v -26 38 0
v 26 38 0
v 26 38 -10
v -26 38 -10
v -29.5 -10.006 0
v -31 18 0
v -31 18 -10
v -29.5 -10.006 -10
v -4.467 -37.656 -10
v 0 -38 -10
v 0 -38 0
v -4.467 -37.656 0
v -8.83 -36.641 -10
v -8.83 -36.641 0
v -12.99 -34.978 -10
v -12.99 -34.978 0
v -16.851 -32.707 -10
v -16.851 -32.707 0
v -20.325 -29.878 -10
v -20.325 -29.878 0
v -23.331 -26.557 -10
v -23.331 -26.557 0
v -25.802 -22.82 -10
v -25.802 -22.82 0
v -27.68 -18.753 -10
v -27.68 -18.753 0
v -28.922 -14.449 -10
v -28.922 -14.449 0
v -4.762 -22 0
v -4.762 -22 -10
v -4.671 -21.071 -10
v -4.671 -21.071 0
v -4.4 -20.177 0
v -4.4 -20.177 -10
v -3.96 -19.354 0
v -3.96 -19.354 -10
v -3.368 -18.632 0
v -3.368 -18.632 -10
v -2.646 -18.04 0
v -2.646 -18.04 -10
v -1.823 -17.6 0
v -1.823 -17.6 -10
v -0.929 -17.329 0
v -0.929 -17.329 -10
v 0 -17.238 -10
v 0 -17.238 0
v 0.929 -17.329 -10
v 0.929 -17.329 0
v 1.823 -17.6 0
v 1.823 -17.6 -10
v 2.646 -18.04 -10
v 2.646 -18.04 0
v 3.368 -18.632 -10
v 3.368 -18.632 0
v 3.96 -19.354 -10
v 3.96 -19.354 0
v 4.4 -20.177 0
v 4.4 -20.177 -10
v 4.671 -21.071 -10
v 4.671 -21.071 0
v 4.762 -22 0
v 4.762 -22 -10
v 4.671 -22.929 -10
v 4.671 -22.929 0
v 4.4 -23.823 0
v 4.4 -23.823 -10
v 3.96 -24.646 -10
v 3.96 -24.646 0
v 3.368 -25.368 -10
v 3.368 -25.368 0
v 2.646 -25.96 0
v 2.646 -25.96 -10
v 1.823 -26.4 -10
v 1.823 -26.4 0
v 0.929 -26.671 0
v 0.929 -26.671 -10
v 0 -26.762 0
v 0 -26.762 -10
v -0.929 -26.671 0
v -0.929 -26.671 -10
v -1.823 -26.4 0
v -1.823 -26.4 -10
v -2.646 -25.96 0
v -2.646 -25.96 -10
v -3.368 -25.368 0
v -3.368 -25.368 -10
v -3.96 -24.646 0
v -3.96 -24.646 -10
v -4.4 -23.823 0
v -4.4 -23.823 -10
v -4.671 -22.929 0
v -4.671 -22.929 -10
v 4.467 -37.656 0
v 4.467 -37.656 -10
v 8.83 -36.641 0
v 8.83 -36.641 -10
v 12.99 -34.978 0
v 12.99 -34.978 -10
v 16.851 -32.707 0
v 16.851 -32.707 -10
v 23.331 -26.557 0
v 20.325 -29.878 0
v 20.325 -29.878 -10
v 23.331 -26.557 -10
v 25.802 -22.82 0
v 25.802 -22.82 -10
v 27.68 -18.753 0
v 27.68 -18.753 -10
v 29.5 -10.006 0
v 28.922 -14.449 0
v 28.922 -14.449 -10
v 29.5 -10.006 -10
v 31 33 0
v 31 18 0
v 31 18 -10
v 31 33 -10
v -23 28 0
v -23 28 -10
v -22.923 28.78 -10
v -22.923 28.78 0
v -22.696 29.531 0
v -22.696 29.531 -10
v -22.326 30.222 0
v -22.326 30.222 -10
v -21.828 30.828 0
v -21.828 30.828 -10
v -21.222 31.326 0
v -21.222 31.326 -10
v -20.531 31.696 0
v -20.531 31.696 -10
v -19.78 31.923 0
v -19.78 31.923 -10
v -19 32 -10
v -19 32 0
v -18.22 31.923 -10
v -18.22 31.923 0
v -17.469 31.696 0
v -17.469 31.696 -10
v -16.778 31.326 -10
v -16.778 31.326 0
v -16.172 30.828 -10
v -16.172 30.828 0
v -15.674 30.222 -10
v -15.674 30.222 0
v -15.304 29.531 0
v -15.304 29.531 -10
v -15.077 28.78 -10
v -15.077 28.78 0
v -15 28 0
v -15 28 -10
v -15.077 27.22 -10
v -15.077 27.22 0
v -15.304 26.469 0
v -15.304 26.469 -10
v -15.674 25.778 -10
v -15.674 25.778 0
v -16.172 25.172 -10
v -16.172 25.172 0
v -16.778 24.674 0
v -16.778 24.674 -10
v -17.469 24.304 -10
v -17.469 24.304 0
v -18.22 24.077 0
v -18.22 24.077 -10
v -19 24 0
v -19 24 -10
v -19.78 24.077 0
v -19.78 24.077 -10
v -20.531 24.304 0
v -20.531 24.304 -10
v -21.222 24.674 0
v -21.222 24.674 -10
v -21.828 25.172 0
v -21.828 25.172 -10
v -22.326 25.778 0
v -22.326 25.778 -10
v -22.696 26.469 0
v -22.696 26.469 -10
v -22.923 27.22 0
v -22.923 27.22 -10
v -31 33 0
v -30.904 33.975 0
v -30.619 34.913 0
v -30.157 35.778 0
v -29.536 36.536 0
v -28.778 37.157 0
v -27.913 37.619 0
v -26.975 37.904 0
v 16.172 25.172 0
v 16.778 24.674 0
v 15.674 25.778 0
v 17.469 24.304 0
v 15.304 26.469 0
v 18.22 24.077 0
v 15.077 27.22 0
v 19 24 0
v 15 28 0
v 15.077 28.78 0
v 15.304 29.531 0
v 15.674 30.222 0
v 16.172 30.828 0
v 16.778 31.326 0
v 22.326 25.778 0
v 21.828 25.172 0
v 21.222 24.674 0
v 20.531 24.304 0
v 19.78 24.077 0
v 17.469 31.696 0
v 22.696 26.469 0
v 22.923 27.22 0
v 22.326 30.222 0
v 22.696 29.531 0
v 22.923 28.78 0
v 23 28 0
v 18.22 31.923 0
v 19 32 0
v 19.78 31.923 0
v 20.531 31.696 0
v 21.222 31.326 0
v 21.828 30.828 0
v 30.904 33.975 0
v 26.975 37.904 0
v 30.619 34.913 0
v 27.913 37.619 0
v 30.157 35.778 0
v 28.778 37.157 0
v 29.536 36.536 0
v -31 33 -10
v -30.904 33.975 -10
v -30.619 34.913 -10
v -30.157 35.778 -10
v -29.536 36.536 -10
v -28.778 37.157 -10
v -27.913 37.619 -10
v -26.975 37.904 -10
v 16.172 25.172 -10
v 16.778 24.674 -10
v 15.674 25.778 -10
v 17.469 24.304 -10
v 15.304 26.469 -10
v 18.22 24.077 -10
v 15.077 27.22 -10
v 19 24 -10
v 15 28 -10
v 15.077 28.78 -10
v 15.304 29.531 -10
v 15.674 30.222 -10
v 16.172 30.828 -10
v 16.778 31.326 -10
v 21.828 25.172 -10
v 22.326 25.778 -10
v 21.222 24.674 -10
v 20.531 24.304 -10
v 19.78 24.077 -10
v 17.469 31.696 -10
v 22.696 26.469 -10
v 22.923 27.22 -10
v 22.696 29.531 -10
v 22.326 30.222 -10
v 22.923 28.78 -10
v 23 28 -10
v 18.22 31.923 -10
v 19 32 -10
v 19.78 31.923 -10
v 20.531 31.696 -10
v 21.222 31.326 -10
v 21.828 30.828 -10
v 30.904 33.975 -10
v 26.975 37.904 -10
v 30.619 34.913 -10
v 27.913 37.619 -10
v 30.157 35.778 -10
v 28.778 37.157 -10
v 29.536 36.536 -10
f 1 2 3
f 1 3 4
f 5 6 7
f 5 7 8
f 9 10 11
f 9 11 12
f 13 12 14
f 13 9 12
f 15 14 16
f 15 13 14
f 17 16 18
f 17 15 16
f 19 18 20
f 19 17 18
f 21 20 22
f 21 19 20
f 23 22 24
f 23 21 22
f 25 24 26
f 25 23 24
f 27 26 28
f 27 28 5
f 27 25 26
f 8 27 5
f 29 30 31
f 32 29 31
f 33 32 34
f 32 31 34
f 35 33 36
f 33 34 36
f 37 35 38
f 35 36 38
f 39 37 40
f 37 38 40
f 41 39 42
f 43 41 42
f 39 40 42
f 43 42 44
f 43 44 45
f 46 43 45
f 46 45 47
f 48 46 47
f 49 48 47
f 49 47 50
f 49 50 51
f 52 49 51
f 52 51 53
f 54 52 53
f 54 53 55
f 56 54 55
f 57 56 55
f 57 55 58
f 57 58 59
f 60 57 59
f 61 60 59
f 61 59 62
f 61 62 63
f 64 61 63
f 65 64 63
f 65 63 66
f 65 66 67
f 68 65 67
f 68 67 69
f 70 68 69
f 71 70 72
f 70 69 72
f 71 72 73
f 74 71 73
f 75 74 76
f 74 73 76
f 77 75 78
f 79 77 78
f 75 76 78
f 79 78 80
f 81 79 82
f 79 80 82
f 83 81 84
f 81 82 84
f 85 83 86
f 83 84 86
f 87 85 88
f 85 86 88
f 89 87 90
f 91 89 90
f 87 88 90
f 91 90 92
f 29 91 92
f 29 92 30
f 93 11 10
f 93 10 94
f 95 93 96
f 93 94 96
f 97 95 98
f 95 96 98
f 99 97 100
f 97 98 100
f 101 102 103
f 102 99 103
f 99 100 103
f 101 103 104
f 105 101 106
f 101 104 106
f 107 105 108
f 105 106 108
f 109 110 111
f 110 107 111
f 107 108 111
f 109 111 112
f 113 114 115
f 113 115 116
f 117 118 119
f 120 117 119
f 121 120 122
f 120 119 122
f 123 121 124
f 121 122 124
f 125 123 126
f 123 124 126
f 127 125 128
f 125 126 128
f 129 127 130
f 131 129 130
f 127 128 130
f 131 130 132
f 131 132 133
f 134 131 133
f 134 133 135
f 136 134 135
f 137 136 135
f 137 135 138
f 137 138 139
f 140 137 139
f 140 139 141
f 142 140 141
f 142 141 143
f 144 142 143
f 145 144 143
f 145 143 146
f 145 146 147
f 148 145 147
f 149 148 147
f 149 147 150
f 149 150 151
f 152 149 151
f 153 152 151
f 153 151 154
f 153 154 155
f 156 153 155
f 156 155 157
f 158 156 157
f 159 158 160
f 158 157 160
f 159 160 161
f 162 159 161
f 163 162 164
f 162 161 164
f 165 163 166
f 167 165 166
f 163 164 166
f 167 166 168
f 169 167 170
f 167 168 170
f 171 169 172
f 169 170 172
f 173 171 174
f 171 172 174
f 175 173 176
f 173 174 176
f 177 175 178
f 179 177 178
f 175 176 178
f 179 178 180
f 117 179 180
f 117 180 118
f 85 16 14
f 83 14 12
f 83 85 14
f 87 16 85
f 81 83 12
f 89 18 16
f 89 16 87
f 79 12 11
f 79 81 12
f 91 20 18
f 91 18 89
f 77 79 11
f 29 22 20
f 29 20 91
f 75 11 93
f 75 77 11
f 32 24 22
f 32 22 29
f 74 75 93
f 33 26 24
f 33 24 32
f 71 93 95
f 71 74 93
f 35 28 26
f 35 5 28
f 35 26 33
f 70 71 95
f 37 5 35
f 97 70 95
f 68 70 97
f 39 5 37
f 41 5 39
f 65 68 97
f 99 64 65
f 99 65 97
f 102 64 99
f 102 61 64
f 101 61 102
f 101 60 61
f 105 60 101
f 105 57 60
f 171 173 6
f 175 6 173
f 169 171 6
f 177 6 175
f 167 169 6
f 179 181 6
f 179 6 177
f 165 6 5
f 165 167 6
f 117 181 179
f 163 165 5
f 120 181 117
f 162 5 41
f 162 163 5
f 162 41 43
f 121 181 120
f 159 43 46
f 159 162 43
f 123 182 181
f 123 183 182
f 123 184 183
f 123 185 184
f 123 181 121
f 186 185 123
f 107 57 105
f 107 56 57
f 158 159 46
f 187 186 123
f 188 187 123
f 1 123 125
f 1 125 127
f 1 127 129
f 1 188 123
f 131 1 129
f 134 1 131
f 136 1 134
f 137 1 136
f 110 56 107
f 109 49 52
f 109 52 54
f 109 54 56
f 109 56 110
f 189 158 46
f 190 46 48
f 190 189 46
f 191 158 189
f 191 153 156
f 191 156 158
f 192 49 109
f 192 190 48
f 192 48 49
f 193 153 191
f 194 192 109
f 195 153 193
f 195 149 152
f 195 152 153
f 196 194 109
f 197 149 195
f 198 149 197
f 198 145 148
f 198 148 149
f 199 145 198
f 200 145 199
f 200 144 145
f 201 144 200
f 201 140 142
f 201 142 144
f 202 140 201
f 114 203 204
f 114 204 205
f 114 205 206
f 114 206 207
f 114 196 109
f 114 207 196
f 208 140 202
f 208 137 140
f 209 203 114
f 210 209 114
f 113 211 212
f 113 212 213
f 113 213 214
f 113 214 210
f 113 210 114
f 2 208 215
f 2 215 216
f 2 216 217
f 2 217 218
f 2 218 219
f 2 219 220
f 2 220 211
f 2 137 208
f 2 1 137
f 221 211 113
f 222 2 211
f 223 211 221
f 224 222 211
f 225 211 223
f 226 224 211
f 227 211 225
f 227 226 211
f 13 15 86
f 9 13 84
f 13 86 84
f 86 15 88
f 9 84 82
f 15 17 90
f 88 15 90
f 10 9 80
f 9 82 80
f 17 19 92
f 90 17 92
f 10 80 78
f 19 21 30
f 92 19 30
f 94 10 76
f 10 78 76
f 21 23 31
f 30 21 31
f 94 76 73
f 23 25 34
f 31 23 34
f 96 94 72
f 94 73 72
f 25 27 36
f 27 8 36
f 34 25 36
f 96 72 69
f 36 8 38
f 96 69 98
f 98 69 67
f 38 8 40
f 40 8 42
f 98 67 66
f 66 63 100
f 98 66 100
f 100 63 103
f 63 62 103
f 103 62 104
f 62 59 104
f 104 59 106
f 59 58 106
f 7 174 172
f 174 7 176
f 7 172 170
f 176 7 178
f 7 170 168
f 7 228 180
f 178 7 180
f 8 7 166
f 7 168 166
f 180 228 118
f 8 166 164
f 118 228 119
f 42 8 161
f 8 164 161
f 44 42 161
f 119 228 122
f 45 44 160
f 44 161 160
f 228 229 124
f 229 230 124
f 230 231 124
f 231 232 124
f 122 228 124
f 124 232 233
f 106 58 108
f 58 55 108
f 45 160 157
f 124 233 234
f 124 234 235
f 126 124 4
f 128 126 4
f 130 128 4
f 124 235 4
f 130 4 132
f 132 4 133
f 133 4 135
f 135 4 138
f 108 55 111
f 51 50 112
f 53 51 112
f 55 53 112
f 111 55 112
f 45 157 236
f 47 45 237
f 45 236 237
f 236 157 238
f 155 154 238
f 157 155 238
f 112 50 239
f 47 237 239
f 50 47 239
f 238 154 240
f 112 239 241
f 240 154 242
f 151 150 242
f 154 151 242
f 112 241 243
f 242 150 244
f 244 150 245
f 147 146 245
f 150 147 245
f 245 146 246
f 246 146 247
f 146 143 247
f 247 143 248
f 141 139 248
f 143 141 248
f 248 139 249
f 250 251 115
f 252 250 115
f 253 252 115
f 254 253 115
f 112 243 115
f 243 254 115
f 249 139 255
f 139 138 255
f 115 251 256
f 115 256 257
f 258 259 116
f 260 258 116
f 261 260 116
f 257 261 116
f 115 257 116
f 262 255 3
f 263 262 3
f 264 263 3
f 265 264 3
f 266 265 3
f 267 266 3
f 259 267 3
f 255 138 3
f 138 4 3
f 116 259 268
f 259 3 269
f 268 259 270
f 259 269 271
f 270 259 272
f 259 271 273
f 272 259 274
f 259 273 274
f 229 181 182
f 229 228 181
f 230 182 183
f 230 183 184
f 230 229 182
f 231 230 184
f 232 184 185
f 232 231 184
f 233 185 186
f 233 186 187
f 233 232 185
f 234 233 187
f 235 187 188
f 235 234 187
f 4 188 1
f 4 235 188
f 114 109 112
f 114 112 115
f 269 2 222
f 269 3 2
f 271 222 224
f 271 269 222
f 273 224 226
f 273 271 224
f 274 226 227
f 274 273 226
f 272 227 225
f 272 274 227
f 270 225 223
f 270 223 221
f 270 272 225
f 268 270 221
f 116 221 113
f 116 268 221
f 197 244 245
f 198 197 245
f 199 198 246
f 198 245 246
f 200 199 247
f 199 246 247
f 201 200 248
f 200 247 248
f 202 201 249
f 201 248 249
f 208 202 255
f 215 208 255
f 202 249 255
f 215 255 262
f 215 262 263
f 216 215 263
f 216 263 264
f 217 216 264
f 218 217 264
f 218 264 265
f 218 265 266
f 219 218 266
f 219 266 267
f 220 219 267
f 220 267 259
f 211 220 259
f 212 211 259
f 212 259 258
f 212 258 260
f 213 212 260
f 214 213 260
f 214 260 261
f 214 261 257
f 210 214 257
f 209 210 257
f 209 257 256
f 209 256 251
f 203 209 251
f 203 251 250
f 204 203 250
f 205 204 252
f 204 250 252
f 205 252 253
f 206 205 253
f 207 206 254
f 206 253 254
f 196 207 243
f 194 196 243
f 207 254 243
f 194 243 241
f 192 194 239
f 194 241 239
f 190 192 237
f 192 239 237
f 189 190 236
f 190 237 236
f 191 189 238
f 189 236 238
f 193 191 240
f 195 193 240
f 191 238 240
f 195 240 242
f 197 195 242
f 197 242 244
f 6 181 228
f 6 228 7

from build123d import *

# Parameters (mm, degrees)
F0_W        = 56
F0_H        = 76
F1_DEPTH    = 10
F2_D        = 9.525
F3_T1_DEPTH = 150.1699053678
F4_R        = 5
F5_D        = 8


# Not quite as in the source:
# - a fillet or chamfer that OpenCascade refuses, or shapes differently, is made with other operations: its cross-section is extruded or revolved along the edge and cut away or added
# - a length typed as a fraction of an inch, garbled in the dataset ("3 / 203.2 mm" for 3/8 in), is restored


with BuildPart() as f1:
    # F0 (on Top) → F1 (new body)
    with BuildSketch(Plane.XY):
        Rectangle(F0_W, F0_H)
        Polygon((-31, 18), (-28, -38), (-28, 38), (-31, 38), align=None)
        Polygon((28, 38), (28, -38), (31, 18), (31, 38), align=None)
    extrude(amount=-F1_DEPTH)

    # F2 (through all)
    with Locations(Plane.XY):
        with Locations((0, -22)):
            Hole(F2_D / 2)

    # F3: fillet of radius 29.576 on 2 edges, made by hand

    # F3_s2 → F3_t1 (cut)
    with BuildSketch(Plane.XY.offset(-80.0849526839)):
        with BuildLine():
            ThreePointArc((-0.0339810736, -38), (20.3123431081, -29.889480854), (29.4996700065, -10.0061598793))
            Line((29.4996700065, -10.0061598793), (28, -38))
            Line((28, -38), (-0.0339810736, -38))
        make_face()
        with BuildLine():
            ThreePointArc((0.0339810736, -38), (-20.3123431081, -29.889480854), (-29.4996700065, -10.0061598793))
            Line((-29.4996700065, -10.0061598793), (-28, -38))
            Line((-28, -38), (0.0339810736, -38))
        make_face()
    extrude(amount=F3_T1_DEPTH, mode=Mode.SUBTRACT)

    # F4
    f4_edges = [f1.edges().sort_by_distance(p)[0] for p in [
        (-31, 38, -5),
        (31, 38, -5),
    ]]
    fillet(f4_edges, radius=F4_R)

    # F5 (through all)
    with Locations(Plane.XY):
        with Locations((-19, 28), (19, 28)):
            Hole(F5_D / 2)


solid = f1.part
